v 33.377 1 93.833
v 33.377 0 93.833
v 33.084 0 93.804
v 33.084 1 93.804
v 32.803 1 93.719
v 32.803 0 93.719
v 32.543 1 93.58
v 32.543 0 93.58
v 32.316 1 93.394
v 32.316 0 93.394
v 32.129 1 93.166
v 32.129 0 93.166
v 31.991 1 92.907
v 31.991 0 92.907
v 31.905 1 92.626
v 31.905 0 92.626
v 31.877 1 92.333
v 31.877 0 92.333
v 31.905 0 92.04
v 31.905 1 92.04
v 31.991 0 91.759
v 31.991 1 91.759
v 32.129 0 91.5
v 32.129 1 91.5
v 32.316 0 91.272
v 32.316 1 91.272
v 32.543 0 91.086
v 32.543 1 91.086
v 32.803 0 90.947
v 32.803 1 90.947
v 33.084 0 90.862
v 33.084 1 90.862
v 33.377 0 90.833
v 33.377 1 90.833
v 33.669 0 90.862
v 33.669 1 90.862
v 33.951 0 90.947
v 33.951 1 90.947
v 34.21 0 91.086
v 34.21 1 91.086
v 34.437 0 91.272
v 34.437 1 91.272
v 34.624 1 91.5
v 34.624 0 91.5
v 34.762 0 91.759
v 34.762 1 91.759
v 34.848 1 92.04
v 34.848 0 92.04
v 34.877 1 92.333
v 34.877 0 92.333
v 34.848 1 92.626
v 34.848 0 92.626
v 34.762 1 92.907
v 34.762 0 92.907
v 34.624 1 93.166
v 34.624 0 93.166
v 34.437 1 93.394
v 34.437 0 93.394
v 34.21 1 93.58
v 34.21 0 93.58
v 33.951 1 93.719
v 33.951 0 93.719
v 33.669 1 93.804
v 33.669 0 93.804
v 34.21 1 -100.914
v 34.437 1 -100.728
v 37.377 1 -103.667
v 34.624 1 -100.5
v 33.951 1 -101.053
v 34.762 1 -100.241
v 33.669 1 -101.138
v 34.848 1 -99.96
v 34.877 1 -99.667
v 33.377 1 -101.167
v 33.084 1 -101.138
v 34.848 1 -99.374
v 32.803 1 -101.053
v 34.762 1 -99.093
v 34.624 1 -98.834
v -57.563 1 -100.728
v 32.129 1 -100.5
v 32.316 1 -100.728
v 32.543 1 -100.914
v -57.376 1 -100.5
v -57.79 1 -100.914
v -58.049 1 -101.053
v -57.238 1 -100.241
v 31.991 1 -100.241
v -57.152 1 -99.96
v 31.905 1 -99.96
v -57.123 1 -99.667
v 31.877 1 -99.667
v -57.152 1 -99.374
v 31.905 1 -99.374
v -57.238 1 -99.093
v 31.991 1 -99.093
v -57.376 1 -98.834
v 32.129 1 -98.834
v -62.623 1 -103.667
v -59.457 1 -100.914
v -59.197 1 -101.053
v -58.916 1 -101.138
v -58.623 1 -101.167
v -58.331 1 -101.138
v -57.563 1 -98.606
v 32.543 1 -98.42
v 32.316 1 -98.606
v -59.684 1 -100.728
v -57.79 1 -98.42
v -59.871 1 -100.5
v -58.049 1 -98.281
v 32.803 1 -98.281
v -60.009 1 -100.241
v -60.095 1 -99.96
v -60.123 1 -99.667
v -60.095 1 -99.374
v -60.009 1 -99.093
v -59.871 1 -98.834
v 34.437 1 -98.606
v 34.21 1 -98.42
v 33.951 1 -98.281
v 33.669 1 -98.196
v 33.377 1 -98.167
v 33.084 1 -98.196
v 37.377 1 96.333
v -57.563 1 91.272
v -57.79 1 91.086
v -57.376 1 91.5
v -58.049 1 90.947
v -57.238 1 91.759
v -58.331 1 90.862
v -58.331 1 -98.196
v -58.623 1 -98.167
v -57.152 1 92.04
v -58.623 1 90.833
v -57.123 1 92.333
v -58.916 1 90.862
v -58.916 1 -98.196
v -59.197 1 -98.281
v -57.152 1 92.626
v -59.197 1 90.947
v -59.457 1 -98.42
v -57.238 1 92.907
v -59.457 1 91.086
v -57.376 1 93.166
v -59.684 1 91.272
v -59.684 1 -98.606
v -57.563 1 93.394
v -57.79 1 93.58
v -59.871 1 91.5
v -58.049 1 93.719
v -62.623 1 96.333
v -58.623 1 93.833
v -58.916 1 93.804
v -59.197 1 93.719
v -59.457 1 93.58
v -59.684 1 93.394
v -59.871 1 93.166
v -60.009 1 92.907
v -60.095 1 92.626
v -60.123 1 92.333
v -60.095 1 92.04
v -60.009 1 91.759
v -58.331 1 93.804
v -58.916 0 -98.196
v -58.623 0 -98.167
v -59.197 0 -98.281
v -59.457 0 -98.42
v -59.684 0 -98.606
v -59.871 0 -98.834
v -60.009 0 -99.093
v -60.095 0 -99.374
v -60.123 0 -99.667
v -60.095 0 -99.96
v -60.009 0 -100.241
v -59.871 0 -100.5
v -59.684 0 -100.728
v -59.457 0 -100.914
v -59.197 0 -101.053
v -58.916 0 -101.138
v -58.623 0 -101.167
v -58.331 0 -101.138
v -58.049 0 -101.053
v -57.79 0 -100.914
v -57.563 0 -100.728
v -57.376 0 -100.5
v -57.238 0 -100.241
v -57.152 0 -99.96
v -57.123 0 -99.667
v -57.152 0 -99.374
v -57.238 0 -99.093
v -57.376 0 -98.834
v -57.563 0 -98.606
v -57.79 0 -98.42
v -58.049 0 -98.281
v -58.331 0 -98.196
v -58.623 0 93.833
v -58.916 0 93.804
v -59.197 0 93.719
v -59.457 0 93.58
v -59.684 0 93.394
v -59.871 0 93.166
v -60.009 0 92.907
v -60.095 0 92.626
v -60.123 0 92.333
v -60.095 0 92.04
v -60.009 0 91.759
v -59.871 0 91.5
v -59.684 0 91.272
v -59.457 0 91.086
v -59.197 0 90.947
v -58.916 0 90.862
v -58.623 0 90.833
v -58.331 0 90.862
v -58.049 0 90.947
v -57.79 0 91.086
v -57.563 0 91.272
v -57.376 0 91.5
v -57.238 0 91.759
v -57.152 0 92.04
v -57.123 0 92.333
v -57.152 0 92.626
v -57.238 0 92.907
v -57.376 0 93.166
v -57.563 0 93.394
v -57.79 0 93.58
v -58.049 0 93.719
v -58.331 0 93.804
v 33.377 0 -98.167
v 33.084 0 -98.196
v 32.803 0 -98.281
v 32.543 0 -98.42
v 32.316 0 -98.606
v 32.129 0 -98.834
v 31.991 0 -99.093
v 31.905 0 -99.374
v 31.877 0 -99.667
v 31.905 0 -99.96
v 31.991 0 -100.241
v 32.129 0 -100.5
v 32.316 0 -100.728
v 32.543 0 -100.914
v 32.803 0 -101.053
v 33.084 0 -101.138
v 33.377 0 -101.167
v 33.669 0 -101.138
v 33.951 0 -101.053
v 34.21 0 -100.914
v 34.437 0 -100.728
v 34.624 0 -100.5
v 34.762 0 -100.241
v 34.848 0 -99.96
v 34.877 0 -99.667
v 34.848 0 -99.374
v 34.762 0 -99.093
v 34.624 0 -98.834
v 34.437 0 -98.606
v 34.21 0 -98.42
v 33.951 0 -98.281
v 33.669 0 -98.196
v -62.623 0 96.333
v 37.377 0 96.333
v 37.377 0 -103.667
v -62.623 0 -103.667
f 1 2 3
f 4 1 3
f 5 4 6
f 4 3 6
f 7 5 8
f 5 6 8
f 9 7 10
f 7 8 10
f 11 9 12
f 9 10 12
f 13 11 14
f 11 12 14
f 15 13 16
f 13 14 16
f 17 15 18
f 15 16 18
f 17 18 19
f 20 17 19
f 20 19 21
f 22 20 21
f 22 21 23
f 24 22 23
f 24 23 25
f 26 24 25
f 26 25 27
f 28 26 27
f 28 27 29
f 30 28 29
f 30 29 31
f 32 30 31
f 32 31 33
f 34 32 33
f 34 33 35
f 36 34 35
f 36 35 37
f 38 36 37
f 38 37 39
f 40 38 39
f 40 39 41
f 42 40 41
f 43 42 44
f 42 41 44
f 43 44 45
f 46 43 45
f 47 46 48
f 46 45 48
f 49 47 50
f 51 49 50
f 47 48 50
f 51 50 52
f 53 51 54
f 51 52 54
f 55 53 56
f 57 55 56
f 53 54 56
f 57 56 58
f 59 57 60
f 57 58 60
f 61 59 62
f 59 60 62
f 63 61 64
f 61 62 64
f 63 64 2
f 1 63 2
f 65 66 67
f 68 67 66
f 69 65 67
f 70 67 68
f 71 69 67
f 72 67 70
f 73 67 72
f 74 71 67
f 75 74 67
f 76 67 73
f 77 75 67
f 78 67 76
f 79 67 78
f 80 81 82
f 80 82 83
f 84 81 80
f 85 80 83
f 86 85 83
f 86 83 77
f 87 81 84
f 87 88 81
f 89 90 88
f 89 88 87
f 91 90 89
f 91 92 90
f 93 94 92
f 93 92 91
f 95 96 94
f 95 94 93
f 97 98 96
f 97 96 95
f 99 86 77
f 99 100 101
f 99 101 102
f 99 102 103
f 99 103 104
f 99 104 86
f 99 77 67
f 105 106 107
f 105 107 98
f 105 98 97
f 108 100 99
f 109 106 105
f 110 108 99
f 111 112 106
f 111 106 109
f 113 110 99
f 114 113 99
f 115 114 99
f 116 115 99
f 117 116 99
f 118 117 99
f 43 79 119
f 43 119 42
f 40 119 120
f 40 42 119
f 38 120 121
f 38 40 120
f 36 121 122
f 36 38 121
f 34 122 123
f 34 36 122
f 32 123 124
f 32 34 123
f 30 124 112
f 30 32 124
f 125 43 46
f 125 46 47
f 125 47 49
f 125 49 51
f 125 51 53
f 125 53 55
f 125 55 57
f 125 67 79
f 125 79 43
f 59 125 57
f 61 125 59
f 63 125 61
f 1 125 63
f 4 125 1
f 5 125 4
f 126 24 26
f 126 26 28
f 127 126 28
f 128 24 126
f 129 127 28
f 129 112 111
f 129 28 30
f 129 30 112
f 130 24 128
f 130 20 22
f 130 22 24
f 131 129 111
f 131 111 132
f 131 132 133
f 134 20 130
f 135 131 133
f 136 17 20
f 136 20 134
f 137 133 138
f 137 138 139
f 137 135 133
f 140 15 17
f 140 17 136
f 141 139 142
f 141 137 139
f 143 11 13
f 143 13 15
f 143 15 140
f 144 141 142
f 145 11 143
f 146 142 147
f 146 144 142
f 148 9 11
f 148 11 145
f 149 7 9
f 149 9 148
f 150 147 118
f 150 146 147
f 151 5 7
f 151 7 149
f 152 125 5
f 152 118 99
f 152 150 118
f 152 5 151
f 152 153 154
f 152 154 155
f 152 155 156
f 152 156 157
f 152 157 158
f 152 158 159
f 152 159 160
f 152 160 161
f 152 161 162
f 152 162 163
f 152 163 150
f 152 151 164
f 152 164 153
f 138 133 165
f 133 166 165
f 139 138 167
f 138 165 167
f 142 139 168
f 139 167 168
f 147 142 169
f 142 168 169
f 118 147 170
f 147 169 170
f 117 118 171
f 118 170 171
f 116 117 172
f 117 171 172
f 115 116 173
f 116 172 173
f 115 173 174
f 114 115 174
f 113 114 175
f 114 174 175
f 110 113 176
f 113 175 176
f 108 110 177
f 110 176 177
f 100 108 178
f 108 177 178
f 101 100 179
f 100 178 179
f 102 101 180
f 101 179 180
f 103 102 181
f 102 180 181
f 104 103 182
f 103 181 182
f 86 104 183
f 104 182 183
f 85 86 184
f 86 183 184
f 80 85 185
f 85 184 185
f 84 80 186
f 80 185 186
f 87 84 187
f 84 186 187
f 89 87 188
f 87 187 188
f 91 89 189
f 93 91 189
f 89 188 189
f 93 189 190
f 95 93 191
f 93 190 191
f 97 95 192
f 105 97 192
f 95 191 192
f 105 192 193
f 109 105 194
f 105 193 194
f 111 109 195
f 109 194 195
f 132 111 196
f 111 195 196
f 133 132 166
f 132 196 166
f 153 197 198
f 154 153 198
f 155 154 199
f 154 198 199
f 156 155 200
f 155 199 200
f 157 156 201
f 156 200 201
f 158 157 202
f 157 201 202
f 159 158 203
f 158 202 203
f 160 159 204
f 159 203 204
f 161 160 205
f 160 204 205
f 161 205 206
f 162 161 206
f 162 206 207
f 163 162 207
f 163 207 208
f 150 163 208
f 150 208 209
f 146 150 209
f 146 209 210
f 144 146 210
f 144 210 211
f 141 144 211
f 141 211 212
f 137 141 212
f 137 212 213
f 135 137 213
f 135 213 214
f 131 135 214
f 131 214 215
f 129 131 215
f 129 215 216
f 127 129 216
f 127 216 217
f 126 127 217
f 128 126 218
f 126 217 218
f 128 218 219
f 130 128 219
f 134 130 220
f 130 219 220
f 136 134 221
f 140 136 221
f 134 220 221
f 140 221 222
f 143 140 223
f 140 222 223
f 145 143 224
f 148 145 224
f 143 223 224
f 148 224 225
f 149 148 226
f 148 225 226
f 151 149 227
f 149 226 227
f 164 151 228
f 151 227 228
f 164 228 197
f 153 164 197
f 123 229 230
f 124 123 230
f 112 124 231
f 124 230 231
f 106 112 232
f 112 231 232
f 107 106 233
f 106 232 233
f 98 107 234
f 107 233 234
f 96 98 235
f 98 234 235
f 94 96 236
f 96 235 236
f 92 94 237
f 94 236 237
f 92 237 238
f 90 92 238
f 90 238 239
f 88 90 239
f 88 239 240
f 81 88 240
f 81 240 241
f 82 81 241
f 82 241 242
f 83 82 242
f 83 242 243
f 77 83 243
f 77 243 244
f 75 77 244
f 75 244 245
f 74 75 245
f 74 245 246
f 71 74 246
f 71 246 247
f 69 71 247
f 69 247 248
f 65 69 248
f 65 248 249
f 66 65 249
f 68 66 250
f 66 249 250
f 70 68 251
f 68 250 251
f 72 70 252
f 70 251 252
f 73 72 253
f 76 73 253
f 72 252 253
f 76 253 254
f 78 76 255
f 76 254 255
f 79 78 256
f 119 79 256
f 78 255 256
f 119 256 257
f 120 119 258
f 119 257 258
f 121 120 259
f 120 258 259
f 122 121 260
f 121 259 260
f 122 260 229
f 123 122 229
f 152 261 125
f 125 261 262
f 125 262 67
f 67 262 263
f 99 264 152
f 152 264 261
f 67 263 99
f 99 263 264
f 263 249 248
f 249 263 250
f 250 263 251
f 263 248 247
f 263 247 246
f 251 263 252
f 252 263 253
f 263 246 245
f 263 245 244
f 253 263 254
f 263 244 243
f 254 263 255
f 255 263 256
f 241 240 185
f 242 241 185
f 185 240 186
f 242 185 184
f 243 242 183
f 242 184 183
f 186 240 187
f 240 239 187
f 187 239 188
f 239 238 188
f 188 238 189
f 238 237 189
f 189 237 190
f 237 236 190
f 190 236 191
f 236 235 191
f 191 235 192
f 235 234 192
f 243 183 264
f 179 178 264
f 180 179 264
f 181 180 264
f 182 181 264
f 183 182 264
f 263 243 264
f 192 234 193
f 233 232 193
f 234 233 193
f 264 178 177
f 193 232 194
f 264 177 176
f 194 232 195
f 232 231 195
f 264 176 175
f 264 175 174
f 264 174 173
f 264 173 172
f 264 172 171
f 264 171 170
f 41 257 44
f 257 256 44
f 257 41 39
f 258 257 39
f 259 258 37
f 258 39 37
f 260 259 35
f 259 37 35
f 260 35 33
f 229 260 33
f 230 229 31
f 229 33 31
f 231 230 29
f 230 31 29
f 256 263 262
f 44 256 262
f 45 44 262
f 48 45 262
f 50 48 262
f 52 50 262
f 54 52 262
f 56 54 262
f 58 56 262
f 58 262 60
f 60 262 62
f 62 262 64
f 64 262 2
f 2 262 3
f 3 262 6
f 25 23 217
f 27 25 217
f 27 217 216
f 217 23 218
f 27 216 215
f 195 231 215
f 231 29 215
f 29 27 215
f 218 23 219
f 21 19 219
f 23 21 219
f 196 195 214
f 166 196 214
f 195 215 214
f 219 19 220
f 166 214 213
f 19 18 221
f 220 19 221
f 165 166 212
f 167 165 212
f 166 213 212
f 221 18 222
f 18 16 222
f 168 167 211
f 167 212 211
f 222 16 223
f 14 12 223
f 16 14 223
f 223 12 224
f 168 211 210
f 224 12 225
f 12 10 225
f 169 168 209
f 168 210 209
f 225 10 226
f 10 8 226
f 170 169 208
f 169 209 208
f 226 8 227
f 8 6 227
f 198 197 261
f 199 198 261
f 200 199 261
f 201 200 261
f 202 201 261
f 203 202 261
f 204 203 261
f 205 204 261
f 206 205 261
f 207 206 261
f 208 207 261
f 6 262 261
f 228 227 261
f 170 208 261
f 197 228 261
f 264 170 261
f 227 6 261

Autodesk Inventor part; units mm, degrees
ref_plane "YZ Plane" through (0, 0, 0) normal (1, 0, 0) x (0, 1, 0)
ref_plane "XZ Plane" through (0, 0, 0) normal (0, 1, 0) x (-1, 0, 0)
ref_plane "XY Plane" through (0, 0, 0) normal (0, 0, 1) x (1, 0, 0)
sketch "Sketch1" plane through (0, 0, 0) normal (0, 1, 0) x (-1, 0, 0)
  line L0 (62.6234, 96.3329) -> (-37.3766, 96.3329)
  line L1 (-37.3766, 96.3329) -> (-37.3766, -103.6671)
  line L2 (-37.3766, -103.6671) -> (62.6234, -103.6671)
  line L3 (62.6234, -103.6671) -> (62.6234, 96.3329)
  point P0 (0, 0)
  dimension "d0" = 200
  dimension "d1" = 100
extrude "Extrusion1" add sketch "Sketch1" along normal blind 1
sketch "Sketch2" plane through (0, 1, 0) normal (0, 1, 0) x (1, 0, 0)
  line L0 (-62.6234, 103.6671) -> (-62.6234, -96.3329) projected
  line L1 (37.3766, -96.3329) -> (37.3766, 103.6671) projected
  line L2 (-62.6234, -96.3329) -> (37.3766, -96.3329) projected
  line L3 (37.3766, 103.6671) -> (-62.6234, 103.6671) projected
  point P0 (0, 0)
  point P1 (-58.6234, -92.3329)
  point P2 (33.3766, -92.3329)
  point P3 (33.3766, 99.6671)
  point P4 (-58.6234, 99.6671)
  dimension "d4" = 0
  dimension "d5" = 0
  dimension "d6" = 0
  dimension "d7" = 0
  dimension "d8" = 4
  dimension "d9" = 4
  dimension "d10" = 4
  dimension "d11" = 4
hole "Hole1" at (-58.6234, 1, 92.3329) at (33.3766, 1, 92.3329) at (33.3766, 1, -99.6671) at (-58.6234, 1, -99.6671) direction (0, -1, 0) diameter 3 depth 25.4 tip angle 118.188
equation "\"d1\" = 2 * BoardWidth + BoardGap"
equation "\"d2\" = BoardHeight"
equation "\"d8\" = ScrewHoleOffset"
equation "\"d9\" = ScrewHoleOffset"
equation "\"d10\" = ScrewHoleOffset"
equation "\"d11\" = ScrewHoleOffset"
equation "\"d12\" = ScrewSize"
equation "\"BoardLength\" = 556"
equation "\"BoardWidth\" = 48"
equation "\"ScrewSize\" = 3"
equation "\"ScrewHoleOffset\" = 4"
equation "\"BoardGap\" = 4"
equation "\"BoardHeight\" = 1"
equation "\"BaseWidth\" = 556"
equation "\"HorizOffsetBetweenScrews\" = 192"
equation "\"BaseLength\" = 648"
equation "\"TwoBoardWidth\" = 444"
equation "\"NumberOfGaps\" = 228.6"
equation "\"NumberOfRows\" = 254"
properties part number "PRT1001-211 2U Board"
